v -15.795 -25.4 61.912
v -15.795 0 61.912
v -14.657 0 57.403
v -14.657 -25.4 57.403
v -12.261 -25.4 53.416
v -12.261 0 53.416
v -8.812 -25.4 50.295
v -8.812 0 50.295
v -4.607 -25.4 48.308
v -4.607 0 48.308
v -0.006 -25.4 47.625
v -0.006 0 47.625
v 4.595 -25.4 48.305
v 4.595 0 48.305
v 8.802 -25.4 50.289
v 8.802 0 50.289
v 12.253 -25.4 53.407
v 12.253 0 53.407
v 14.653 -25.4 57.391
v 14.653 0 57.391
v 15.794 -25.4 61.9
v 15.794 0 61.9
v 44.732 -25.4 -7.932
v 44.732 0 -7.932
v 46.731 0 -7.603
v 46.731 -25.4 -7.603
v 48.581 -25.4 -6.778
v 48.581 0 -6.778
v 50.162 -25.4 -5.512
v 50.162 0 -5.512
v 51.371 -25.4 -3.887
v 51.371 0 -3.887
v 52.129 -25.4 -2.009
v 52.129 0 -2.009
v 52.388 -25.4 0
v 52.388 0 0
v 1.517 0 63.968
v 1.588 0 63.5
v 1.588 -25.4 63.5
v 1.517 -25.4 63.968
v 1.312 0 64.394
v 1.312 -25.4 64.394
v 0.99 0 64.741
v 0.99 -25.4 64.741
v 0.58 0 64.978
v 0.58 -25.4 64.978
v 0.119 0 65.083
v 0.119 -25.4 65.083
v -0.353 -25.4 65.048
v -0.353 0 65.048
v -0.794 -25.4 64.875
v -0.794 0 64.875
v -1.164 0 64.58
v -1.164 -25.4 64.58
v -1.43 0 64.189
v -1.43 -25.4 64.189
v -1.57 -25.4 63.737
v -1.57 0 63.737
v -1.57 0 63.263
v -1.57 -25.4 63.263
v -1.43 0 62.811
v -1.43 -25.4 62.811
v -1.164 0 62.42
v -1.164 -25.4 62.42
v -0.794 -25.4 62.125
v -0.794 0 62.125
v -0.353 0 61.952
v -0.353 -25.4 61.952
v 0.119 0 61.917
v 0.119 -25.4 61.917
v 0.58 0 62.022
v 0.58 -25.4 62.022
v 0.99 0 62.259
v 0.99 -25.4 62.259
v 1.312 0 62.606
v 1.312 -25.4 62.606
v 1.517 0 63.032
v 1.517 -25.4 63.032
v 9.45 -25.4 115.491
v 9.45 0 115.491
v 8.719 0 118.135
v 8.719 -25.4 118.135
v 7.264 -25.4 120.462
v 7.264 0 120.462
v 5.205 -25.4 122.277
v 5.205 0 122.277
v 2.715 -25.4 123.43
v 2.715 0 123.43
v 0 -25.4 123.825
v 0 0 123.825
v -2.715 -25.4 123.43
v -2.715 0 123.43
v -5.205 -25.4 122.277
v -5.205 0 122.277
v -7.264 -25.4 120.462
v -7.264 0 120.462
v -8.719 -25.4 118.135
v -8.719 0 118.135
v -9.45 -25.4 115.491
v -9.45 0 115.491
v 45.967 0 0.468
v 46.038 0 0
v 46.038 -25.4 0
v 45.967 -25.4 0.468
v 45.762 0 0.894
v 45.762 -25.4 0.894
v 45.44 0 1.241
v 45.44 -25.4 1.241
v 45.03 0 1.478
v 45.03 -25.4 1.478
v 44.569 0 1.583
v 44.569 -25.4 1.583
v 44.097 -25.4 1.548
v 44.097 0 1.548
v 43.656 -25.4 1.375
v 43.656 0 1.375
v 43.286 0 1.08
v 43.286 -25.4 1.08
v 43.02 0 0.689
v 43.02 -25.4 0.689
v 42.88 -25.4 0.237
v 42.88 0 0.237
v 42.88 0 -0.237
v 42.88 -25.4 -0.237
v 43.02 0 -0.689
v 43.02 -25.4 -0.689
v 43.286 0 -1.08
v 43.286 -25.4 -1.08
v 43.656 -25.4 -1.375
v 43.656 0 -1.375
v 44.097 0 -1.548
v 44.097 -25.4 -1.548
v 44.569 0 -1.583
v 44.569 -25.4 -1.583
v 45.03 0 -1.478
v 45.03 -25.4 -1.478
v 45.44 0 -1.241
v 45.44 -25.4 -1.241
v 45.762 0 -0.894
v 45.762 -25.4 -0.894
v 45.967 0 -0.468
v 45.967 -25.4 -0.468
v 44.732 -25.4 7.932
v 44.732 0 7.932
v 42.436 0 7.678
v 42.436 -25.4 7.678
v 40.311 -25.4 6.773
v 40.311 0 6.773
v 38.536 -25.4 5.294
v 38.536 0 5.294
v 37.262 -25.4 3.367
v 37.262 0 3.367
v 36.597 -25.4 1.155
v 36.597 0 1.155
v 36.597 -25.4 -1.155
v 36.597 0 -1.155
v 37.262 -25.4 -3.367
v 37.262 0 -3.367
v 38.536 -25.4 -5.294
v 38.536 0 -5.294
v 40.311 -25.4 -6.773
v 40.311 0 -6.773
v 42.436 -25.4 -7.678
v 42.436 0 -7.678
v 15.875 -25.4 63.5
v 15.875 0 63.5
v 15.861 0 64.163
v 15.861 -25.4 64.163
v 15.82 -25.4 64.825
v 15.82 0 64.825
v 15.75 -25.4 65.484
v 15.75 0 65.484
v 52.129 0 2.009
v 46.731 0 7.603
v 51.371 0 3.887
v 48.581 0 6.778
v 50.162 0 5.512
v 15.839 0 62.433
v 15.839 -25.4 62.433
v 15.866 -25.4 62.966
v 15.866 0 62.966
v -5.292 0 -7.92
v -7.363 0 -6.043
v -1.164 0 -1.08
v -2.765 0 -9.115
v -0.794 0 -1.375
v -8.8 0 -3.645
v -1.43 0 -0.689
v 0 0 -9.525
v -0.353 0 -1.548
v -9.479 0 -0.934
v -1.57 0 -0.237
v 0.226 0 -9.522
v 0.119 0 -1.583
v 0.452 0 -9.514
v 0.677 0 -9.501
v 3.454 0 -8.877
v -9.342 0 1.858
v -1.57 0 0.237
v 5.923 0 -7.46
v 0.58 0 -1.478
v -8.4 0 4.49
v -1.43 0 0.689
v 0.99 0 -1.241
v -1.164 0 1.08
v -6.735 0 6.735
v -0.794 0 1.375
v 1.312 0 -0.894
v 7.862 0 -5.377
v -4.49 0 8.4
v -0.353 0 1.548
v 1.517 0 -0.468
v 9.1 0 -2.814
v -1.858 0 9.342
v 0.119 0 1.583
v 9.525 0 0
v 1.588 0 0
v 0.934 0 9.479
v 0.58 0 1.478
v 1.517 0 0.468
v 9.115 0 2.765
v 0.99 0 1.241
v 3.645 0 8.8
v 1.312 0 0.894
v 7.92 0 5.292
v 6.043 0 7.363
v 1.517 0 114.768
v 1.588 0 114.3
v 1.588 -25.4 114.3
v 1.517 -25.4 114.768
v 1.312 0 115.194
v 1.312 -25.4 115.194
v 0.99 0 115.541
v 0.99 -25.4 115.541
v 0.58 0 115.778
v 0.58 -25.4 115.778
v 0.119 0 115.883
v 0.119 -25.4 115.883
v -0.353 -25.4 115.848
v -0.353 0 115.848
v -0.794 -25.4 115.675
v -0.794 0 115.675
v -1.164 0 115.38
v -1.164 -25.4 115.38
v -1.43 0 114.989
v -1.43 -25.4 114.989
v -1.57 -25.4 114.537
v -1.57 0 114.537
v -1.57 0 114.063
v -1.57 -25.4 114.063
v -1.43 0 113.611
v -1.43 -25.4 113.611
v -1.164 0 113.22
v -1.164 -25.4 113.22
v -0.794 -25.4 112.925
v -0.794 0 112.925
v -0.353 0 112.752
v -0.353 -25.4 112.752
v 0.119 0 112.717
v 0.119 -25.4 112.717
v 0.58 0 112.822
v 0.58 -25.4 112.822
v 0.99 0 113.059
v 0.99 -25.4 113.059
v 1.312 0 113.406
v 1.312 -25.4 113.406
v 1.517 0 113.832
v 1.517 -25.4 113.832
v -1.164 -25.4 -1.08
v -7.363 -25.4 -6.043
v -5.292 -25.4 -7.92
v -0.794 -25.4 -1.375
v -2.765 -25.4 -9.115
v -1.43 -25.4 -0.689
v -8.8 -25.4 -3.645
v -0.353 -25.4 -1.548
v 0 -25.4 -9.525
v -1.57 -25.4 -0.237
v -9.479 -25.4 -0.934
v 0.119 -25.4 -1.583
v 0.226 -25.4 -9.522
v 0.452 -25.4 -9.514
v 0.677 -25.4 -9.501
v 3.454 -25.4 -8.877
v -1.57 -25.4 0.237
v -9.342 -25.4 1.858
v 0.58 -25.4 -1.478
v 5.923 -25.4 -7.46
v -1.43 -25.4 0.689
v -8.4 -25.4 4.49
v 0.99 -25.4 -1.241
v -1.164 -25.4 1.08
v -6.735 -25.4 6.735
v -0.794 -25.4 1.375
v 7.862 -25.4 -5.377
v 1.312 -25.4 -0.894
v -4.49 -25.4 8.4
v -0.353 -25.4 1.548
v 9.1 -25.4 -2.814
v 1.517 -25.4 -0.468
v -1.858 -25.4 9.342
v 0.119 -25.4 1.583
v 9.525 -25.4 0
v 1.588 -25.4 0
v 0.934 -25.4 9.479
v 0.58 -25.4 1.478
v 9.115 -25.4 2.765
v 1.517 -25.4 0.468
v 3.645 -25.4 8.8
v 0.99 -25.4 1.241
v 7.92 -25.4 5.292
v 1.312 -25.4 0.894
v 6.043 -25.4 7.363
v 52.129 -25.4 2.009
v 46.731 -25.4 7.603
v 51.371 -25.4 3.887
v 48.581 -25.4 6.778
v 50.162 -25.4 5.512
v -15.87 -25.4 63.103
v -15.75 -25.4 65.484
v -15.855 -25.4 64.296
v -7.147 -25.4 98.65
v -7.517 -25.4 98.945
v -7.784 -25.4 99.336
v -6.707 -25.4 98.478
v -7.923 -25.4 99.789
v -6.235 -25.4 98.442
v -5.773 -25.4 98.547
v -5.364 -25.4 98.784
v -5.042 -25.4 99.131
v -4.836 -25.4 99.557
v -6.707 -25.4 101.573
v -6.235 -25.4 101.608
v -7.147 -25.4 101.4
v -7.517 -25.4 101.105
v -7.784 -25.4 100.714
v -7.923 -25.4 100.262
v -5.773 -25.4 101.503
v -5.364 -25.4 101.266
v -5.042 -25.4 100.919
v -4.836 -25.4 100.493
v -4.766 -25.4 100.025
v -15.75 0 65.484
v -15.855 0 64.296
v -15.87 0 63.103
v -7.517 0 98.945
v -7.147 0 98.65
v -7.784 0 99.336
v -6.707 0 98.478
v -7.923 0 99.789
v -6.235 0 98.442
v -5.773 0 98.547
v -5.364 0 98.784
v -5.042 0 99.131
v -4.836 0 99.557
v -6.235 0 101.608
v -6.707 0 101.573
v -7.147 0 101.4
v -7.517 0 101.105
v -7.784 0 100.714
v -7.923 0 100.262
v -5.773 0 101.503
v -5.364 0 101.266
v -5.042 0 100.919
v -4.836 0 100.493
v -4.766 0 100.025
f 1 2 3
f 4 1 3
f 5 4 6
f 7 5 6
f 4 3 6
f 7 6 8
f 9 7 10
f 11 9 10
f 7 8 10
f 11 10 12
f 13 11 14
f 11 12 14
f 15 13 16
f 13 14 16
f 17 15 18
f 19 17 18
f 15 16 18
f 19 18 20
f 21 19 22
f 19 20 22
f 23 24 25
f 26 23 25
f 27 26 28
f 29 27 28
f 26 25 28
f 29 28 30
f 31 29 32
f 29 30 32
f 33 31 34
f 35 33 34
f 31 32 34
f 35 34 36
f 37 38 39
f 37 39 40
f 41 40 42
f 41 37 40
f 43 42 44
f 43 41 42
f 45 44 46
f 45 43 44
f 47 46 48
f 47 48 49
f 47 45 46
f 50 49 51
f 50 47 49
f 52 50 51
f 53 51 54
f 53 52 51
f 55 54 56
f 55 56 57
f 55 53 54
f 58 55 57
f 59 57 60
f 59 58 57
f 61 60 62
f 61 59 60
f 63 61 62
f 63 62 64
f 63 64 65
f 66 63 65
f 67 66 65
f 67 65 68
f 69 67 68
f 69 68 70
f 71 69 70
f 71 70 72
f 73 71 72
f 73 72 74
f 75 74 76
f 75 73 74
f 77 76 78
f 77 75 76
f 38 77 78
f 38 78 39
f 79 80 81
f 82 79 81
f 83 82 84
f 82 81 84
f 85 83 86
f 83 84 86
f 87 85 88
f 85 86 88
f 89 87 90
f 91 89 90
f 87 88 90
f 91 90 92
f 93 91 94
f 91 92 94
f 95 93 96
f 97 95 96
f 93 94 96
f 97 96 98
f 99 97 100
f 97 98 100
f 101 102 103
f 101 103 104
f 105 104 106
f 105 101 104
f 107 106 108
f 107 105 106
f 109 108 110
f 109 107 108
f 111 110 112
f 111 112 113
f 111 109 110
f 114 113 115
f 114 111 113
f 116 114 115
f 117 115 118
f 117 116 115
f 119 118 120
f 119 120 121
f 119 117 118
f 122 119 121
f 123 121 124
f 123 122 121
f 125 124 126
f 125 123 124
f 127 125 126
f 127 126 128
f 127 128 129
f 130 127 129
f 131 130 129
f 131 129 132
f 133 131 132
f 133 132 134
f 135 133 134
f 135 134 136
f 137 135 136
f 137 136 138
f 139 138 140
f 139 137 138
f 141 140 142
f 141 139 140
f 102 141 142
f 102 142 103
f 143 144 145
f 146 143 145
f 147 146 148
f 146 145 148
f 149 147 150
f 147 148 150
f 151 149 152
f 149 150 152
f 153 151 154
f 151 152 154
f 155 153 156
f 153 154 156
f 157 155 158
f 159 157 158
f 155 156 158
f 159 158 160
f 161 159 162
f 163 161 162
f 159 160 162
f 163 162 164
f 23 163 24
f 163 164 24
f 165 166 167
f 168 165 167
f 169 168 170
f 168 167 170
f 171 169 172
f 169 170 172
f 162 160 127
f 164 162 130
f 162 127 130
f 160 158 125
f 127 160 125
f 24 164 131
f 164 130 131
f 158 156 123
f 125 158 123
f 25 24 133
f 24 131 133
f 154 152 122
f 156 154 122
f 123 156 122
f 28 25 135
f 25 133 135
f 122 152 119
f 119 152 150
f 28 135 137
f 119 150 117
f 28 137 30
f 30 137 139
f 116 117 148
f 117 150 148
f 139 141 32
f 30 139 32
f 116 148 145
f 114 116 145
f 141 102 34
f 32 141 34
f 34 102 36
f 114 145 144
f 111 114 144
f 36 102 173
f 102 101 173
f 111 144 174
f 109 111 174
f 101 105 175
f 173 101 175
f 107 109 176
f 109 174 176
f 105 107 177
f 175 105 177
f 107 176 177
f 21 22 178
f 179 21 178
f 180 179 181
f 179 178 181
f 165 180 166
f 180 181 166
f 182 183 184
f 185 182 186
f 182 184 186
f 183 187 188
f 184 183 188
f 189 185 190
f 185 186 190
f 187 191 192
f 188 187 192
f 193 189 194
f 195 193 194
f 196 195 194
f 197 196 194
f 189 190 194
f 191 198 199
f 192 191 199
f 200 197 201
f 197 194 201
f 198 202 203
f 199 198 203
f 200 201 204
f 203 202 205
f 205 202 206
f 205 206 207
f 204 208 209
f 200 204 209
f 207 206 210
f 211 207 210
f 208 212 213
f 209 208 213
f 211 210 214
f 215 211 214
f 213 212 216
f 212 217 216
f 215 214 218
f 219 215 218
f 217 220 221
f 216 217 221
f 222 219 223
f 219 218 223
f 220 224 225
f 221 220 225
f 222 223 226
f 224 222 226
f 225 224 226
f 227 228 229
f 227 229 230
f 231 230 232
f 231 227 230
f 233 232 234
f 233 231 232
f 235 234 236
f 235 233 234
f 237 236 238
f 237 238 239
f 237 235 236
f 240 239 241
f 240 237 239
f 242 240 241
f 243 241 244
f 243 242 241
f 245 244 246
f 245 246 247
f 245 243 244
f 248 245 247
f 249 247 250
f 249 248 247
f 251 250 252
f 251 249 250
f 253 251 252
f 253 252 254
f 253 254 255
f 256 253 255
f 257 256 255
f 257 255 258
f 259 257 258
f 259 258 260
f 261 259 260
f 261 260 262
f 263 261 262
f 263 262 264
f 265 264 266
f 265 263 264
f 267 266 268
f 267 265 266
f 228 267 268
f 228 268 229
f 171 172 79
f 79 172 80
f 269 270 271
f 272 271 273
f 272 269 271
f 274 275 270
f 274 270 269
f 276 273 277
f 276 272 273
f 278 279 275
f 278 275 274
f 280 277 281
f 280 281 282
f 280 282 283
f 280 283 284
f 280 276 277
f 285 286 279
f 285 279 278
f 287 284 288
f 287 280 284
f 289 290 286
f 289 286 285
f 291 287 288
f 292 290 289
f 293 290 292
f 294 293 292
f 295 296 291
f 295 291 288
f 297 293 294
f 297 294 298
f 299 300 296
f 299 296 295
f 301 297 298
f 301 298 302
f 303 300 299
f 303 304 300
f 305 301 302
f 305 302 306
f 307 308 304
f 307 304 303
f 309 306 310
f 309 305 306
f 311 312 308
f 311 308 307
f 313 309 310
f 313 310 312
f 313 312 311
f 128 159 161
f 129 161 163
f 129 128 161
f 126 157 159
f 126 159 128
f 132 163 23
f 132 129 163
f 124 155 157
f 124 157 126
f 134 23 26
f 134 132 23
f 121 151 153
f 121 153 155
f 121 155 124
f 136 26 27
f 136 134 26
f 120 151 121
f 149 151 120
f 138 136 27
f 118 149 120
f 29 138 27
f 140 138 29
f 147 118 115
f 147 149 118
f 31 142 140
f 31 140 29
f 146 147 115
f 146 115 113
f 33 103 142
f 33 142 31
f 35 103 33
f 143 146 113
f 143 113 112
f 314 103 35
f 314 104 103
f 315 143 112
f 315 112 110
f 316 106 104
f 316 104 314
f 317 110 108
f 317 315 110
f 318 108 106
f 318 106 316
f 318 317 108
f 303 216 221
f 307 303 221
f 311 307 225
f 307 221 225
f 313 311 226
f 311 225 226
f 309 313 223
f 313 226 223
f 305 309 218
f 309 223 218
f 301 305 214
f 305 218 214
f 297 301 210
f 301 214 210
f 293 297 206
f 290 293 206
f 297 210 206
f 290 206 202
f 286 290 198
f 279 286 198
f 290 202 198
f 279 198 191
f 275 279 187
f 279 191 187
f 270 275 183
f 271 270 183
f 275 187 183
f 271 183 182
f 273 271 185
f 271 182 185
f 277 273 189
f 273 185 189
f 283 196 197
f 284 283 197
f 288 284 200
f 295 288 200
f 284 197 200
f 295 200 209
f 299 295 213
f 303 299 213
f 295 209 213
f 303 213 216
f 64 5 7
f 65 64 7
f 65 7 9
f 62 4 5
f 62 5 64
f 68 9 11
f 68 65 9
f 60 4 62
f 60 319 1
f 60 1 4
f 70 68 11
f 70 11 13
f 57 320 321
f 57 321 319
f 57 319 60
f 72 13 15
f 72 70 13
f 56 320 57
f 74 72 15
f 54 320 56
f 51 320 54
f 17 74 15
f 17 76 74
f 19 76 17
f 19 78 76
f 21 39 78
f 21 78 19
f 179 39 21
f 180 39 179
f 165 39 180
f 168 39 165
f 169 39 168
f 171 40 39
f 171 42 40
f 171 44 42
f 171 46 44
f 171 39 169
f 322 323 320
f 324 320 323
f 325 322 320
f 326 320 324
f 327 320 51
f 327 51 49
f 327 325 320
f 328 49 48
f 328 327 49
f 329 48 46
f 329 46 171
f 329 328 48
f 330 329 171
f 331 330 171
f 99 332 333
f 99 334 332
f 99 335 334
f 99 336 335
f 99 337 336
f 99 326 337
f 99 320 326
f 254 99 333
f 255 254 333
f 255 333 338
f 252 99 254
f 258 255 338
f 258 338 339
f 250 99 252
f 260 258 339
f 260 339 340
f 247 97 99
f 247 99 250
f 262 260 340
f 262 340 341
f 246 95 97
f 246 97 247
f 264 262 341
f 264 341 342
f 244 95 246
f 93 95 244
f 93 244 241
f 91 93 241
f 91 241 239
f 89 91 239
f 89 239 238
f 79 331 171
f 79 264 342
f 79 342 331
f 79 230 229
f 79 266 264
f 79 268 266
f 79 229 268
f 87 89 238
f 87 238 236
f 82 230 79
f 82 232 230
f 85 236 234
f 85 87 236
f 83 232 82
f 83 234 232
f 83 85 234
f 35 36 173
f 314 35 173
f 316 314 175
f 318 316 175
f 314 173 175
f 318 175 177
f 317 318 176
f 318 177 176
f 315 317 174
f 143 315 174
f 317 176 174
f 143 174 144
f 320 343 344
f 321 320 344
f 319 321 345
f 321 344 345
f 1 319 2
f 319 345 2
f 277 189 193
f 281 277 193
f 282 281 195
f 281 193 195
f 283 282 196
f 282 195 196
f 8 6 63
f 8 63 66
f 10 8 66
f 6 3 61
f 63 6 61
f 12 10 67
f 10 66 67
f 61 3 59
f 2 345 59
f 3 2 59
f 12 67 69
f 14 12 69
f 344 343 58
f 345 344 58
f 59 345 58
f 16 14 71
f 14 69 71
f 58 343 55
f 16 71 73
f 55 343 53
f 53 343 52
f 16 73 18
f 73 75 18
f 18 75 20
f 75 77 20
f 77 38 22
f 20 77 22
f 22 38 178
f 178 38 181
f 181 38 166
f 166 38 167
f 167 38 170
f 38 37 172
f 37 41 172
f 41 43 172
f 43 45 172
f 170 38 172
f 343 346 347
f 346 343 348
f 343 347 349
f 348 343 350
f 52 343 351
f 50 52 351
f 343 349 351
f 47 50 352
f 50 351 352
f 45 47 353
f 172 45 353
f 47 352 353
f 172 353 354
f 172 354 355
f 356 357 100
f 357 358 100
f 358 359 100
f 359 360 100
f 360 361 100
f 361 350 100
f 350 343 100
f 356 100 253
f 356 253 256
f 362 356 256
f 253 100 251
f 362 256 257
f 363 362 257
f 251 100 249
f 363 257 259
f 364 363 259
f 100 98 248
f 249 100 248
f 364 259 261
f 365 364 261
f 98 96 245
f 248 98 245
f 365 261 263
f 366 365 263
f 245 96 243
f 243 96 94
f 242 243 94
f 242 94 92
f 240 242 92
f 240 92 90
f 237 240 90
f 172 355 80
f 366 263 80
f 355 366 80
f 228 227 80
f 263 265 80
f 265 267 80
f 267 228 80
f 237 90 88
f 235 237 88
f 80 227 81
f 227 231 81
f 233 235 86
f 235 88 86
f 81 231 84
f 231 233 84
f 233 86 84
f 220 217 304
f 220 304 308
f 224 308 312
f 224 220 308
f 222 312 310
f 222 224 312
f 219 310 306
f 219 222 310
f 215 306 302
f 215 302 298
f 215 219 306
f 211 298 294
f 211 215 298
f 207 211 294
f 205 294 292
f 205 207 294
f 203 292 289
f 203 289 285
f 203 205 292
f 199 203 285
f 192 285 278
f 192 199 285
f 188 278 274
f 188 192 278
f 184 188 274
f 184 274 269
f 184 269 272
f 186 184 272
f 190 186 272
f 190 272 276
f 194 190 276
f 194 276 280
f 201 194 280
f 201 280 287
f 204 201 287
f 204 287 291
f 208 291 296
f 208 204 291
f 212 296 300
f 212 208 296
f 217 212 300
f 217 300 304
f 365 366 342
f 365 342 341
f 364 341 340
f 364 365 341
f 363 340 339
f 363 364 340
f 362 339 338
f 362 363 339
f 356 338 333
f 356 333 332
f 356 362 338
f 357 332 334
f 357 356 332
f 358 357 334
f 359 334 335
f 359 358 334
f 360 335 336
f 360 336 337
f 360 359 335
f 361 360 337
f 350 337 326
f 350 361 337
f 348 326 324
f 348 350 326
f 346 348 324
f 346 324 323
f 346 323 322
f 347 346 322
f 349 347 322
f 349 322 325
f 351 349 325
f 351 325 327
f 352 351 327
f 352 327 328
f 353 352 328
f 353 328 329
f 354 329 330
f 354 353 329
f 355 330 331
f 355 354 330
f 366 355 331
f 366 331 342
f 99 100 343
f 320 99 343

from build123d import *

# Parameters (mm, degrees)
F0_R     = 1.5875
F1_DEPTH = 25.4


with BuildPart() as f1:
    # F0 (on Front) → F1 (new body)
    with BuildSketch(Plane.XZ):
        with BuildLine():
            ThreePointArc((-9.450293, 115.490625), (-0.596483, 104.793695), (9.525, 114.3))
            ThreePointArc((9.525, 114.3), (9.506305, 114.896483), (9.450293, 115.490625))
            ThreePointArc((9.450293, 115.490625), (0, 123.825), (-9.450293, 115.490625))
        make_face()
        with Locations((0, 114.3)):
            Circle(F0_R, mode=Mode.SUBTRACT)
        with BuildLine():
            ThreePointArc((9.450293, 115.490625), (9.506305, 114.896483), (9.525, 114.3))
            ThreePointArc((9.525, 114.3), (-0.596483, 104.793695), (-9.450293, 115.490625))
            Line((-9.450293, 115.490625), (-15.750488, 65.484375))
            ThreePointArc((-15.750488, 65.484375), (0, 79.375), (15.750488, 65.484375))
            Line((15.750488, 65.484375), (9.450293, 115.490625))
        make_face()
        with Locations((-6.353402, 100.0252)):
            Circle(F0_R, mode=Mode.SUBTRACT)
        with BuildLine():
            ThreePointArc((0, -9.525), (0.338886, -9.51897), (0.677344, -9.500886))
            Line((0.677344, -9.500886), (0, -9.525))
        make_face()
        with BuildLine():
            Line((0, -9.525), (0.677344, -9.500886))
            ThreePointArc((0.677344, -9.500886), (6.970557, -6.491299), (9.525, 0))
            ThreePointArc((9.525, 0), (-6.735192, 6.735192), (0, -9.525))
        make_face()
        Circle(F0_R, mode=Mode.SUBTRACT)
        with BuildLine():
            ThreePointArc((52.3875, 0), (50.161633, 5.51191), (44.732405, 7.932475))
            ThreePointArc((44.732405, 7.932475), (36.5125, 0), (44.732405, -7.932475))
            ThreePointArc((44.732405, -7.932475), (50.161633, -5.51191), (52.3875, 0))
        make_face()
        with Locations((44.45, 0)):
            Circle(F0_R, mode=Mode.SUBTRACT)
        with BuildLine():
            ThreePointArc((15.875, 63.5), (15.843841, 64.494139), (15.750488, 65.484375))
            ThreePointArc((15.750488, 65.484375), (0, 79.375), (-15.750488, 65.484375))
            ThreePointArc((-15.750488, 65.484375), (-15.873744, 63.699705), (-15.795426, 61.9125))
            ThreePointArc((-15.795426, 61.9125), (-0.006091, 47.625001), (15.794203, 61.90038))
            ThreePointArc((15.794203, 61.90038), (15.854788, 62.699171), (15.875, 63.5))
        make_face()
        with Locations((0, 63.5)):
            Circle(F0_R, mode=Mode.SUBTRACT)
    extrude(amount=F1_DEPTH)


solid = f1.part
